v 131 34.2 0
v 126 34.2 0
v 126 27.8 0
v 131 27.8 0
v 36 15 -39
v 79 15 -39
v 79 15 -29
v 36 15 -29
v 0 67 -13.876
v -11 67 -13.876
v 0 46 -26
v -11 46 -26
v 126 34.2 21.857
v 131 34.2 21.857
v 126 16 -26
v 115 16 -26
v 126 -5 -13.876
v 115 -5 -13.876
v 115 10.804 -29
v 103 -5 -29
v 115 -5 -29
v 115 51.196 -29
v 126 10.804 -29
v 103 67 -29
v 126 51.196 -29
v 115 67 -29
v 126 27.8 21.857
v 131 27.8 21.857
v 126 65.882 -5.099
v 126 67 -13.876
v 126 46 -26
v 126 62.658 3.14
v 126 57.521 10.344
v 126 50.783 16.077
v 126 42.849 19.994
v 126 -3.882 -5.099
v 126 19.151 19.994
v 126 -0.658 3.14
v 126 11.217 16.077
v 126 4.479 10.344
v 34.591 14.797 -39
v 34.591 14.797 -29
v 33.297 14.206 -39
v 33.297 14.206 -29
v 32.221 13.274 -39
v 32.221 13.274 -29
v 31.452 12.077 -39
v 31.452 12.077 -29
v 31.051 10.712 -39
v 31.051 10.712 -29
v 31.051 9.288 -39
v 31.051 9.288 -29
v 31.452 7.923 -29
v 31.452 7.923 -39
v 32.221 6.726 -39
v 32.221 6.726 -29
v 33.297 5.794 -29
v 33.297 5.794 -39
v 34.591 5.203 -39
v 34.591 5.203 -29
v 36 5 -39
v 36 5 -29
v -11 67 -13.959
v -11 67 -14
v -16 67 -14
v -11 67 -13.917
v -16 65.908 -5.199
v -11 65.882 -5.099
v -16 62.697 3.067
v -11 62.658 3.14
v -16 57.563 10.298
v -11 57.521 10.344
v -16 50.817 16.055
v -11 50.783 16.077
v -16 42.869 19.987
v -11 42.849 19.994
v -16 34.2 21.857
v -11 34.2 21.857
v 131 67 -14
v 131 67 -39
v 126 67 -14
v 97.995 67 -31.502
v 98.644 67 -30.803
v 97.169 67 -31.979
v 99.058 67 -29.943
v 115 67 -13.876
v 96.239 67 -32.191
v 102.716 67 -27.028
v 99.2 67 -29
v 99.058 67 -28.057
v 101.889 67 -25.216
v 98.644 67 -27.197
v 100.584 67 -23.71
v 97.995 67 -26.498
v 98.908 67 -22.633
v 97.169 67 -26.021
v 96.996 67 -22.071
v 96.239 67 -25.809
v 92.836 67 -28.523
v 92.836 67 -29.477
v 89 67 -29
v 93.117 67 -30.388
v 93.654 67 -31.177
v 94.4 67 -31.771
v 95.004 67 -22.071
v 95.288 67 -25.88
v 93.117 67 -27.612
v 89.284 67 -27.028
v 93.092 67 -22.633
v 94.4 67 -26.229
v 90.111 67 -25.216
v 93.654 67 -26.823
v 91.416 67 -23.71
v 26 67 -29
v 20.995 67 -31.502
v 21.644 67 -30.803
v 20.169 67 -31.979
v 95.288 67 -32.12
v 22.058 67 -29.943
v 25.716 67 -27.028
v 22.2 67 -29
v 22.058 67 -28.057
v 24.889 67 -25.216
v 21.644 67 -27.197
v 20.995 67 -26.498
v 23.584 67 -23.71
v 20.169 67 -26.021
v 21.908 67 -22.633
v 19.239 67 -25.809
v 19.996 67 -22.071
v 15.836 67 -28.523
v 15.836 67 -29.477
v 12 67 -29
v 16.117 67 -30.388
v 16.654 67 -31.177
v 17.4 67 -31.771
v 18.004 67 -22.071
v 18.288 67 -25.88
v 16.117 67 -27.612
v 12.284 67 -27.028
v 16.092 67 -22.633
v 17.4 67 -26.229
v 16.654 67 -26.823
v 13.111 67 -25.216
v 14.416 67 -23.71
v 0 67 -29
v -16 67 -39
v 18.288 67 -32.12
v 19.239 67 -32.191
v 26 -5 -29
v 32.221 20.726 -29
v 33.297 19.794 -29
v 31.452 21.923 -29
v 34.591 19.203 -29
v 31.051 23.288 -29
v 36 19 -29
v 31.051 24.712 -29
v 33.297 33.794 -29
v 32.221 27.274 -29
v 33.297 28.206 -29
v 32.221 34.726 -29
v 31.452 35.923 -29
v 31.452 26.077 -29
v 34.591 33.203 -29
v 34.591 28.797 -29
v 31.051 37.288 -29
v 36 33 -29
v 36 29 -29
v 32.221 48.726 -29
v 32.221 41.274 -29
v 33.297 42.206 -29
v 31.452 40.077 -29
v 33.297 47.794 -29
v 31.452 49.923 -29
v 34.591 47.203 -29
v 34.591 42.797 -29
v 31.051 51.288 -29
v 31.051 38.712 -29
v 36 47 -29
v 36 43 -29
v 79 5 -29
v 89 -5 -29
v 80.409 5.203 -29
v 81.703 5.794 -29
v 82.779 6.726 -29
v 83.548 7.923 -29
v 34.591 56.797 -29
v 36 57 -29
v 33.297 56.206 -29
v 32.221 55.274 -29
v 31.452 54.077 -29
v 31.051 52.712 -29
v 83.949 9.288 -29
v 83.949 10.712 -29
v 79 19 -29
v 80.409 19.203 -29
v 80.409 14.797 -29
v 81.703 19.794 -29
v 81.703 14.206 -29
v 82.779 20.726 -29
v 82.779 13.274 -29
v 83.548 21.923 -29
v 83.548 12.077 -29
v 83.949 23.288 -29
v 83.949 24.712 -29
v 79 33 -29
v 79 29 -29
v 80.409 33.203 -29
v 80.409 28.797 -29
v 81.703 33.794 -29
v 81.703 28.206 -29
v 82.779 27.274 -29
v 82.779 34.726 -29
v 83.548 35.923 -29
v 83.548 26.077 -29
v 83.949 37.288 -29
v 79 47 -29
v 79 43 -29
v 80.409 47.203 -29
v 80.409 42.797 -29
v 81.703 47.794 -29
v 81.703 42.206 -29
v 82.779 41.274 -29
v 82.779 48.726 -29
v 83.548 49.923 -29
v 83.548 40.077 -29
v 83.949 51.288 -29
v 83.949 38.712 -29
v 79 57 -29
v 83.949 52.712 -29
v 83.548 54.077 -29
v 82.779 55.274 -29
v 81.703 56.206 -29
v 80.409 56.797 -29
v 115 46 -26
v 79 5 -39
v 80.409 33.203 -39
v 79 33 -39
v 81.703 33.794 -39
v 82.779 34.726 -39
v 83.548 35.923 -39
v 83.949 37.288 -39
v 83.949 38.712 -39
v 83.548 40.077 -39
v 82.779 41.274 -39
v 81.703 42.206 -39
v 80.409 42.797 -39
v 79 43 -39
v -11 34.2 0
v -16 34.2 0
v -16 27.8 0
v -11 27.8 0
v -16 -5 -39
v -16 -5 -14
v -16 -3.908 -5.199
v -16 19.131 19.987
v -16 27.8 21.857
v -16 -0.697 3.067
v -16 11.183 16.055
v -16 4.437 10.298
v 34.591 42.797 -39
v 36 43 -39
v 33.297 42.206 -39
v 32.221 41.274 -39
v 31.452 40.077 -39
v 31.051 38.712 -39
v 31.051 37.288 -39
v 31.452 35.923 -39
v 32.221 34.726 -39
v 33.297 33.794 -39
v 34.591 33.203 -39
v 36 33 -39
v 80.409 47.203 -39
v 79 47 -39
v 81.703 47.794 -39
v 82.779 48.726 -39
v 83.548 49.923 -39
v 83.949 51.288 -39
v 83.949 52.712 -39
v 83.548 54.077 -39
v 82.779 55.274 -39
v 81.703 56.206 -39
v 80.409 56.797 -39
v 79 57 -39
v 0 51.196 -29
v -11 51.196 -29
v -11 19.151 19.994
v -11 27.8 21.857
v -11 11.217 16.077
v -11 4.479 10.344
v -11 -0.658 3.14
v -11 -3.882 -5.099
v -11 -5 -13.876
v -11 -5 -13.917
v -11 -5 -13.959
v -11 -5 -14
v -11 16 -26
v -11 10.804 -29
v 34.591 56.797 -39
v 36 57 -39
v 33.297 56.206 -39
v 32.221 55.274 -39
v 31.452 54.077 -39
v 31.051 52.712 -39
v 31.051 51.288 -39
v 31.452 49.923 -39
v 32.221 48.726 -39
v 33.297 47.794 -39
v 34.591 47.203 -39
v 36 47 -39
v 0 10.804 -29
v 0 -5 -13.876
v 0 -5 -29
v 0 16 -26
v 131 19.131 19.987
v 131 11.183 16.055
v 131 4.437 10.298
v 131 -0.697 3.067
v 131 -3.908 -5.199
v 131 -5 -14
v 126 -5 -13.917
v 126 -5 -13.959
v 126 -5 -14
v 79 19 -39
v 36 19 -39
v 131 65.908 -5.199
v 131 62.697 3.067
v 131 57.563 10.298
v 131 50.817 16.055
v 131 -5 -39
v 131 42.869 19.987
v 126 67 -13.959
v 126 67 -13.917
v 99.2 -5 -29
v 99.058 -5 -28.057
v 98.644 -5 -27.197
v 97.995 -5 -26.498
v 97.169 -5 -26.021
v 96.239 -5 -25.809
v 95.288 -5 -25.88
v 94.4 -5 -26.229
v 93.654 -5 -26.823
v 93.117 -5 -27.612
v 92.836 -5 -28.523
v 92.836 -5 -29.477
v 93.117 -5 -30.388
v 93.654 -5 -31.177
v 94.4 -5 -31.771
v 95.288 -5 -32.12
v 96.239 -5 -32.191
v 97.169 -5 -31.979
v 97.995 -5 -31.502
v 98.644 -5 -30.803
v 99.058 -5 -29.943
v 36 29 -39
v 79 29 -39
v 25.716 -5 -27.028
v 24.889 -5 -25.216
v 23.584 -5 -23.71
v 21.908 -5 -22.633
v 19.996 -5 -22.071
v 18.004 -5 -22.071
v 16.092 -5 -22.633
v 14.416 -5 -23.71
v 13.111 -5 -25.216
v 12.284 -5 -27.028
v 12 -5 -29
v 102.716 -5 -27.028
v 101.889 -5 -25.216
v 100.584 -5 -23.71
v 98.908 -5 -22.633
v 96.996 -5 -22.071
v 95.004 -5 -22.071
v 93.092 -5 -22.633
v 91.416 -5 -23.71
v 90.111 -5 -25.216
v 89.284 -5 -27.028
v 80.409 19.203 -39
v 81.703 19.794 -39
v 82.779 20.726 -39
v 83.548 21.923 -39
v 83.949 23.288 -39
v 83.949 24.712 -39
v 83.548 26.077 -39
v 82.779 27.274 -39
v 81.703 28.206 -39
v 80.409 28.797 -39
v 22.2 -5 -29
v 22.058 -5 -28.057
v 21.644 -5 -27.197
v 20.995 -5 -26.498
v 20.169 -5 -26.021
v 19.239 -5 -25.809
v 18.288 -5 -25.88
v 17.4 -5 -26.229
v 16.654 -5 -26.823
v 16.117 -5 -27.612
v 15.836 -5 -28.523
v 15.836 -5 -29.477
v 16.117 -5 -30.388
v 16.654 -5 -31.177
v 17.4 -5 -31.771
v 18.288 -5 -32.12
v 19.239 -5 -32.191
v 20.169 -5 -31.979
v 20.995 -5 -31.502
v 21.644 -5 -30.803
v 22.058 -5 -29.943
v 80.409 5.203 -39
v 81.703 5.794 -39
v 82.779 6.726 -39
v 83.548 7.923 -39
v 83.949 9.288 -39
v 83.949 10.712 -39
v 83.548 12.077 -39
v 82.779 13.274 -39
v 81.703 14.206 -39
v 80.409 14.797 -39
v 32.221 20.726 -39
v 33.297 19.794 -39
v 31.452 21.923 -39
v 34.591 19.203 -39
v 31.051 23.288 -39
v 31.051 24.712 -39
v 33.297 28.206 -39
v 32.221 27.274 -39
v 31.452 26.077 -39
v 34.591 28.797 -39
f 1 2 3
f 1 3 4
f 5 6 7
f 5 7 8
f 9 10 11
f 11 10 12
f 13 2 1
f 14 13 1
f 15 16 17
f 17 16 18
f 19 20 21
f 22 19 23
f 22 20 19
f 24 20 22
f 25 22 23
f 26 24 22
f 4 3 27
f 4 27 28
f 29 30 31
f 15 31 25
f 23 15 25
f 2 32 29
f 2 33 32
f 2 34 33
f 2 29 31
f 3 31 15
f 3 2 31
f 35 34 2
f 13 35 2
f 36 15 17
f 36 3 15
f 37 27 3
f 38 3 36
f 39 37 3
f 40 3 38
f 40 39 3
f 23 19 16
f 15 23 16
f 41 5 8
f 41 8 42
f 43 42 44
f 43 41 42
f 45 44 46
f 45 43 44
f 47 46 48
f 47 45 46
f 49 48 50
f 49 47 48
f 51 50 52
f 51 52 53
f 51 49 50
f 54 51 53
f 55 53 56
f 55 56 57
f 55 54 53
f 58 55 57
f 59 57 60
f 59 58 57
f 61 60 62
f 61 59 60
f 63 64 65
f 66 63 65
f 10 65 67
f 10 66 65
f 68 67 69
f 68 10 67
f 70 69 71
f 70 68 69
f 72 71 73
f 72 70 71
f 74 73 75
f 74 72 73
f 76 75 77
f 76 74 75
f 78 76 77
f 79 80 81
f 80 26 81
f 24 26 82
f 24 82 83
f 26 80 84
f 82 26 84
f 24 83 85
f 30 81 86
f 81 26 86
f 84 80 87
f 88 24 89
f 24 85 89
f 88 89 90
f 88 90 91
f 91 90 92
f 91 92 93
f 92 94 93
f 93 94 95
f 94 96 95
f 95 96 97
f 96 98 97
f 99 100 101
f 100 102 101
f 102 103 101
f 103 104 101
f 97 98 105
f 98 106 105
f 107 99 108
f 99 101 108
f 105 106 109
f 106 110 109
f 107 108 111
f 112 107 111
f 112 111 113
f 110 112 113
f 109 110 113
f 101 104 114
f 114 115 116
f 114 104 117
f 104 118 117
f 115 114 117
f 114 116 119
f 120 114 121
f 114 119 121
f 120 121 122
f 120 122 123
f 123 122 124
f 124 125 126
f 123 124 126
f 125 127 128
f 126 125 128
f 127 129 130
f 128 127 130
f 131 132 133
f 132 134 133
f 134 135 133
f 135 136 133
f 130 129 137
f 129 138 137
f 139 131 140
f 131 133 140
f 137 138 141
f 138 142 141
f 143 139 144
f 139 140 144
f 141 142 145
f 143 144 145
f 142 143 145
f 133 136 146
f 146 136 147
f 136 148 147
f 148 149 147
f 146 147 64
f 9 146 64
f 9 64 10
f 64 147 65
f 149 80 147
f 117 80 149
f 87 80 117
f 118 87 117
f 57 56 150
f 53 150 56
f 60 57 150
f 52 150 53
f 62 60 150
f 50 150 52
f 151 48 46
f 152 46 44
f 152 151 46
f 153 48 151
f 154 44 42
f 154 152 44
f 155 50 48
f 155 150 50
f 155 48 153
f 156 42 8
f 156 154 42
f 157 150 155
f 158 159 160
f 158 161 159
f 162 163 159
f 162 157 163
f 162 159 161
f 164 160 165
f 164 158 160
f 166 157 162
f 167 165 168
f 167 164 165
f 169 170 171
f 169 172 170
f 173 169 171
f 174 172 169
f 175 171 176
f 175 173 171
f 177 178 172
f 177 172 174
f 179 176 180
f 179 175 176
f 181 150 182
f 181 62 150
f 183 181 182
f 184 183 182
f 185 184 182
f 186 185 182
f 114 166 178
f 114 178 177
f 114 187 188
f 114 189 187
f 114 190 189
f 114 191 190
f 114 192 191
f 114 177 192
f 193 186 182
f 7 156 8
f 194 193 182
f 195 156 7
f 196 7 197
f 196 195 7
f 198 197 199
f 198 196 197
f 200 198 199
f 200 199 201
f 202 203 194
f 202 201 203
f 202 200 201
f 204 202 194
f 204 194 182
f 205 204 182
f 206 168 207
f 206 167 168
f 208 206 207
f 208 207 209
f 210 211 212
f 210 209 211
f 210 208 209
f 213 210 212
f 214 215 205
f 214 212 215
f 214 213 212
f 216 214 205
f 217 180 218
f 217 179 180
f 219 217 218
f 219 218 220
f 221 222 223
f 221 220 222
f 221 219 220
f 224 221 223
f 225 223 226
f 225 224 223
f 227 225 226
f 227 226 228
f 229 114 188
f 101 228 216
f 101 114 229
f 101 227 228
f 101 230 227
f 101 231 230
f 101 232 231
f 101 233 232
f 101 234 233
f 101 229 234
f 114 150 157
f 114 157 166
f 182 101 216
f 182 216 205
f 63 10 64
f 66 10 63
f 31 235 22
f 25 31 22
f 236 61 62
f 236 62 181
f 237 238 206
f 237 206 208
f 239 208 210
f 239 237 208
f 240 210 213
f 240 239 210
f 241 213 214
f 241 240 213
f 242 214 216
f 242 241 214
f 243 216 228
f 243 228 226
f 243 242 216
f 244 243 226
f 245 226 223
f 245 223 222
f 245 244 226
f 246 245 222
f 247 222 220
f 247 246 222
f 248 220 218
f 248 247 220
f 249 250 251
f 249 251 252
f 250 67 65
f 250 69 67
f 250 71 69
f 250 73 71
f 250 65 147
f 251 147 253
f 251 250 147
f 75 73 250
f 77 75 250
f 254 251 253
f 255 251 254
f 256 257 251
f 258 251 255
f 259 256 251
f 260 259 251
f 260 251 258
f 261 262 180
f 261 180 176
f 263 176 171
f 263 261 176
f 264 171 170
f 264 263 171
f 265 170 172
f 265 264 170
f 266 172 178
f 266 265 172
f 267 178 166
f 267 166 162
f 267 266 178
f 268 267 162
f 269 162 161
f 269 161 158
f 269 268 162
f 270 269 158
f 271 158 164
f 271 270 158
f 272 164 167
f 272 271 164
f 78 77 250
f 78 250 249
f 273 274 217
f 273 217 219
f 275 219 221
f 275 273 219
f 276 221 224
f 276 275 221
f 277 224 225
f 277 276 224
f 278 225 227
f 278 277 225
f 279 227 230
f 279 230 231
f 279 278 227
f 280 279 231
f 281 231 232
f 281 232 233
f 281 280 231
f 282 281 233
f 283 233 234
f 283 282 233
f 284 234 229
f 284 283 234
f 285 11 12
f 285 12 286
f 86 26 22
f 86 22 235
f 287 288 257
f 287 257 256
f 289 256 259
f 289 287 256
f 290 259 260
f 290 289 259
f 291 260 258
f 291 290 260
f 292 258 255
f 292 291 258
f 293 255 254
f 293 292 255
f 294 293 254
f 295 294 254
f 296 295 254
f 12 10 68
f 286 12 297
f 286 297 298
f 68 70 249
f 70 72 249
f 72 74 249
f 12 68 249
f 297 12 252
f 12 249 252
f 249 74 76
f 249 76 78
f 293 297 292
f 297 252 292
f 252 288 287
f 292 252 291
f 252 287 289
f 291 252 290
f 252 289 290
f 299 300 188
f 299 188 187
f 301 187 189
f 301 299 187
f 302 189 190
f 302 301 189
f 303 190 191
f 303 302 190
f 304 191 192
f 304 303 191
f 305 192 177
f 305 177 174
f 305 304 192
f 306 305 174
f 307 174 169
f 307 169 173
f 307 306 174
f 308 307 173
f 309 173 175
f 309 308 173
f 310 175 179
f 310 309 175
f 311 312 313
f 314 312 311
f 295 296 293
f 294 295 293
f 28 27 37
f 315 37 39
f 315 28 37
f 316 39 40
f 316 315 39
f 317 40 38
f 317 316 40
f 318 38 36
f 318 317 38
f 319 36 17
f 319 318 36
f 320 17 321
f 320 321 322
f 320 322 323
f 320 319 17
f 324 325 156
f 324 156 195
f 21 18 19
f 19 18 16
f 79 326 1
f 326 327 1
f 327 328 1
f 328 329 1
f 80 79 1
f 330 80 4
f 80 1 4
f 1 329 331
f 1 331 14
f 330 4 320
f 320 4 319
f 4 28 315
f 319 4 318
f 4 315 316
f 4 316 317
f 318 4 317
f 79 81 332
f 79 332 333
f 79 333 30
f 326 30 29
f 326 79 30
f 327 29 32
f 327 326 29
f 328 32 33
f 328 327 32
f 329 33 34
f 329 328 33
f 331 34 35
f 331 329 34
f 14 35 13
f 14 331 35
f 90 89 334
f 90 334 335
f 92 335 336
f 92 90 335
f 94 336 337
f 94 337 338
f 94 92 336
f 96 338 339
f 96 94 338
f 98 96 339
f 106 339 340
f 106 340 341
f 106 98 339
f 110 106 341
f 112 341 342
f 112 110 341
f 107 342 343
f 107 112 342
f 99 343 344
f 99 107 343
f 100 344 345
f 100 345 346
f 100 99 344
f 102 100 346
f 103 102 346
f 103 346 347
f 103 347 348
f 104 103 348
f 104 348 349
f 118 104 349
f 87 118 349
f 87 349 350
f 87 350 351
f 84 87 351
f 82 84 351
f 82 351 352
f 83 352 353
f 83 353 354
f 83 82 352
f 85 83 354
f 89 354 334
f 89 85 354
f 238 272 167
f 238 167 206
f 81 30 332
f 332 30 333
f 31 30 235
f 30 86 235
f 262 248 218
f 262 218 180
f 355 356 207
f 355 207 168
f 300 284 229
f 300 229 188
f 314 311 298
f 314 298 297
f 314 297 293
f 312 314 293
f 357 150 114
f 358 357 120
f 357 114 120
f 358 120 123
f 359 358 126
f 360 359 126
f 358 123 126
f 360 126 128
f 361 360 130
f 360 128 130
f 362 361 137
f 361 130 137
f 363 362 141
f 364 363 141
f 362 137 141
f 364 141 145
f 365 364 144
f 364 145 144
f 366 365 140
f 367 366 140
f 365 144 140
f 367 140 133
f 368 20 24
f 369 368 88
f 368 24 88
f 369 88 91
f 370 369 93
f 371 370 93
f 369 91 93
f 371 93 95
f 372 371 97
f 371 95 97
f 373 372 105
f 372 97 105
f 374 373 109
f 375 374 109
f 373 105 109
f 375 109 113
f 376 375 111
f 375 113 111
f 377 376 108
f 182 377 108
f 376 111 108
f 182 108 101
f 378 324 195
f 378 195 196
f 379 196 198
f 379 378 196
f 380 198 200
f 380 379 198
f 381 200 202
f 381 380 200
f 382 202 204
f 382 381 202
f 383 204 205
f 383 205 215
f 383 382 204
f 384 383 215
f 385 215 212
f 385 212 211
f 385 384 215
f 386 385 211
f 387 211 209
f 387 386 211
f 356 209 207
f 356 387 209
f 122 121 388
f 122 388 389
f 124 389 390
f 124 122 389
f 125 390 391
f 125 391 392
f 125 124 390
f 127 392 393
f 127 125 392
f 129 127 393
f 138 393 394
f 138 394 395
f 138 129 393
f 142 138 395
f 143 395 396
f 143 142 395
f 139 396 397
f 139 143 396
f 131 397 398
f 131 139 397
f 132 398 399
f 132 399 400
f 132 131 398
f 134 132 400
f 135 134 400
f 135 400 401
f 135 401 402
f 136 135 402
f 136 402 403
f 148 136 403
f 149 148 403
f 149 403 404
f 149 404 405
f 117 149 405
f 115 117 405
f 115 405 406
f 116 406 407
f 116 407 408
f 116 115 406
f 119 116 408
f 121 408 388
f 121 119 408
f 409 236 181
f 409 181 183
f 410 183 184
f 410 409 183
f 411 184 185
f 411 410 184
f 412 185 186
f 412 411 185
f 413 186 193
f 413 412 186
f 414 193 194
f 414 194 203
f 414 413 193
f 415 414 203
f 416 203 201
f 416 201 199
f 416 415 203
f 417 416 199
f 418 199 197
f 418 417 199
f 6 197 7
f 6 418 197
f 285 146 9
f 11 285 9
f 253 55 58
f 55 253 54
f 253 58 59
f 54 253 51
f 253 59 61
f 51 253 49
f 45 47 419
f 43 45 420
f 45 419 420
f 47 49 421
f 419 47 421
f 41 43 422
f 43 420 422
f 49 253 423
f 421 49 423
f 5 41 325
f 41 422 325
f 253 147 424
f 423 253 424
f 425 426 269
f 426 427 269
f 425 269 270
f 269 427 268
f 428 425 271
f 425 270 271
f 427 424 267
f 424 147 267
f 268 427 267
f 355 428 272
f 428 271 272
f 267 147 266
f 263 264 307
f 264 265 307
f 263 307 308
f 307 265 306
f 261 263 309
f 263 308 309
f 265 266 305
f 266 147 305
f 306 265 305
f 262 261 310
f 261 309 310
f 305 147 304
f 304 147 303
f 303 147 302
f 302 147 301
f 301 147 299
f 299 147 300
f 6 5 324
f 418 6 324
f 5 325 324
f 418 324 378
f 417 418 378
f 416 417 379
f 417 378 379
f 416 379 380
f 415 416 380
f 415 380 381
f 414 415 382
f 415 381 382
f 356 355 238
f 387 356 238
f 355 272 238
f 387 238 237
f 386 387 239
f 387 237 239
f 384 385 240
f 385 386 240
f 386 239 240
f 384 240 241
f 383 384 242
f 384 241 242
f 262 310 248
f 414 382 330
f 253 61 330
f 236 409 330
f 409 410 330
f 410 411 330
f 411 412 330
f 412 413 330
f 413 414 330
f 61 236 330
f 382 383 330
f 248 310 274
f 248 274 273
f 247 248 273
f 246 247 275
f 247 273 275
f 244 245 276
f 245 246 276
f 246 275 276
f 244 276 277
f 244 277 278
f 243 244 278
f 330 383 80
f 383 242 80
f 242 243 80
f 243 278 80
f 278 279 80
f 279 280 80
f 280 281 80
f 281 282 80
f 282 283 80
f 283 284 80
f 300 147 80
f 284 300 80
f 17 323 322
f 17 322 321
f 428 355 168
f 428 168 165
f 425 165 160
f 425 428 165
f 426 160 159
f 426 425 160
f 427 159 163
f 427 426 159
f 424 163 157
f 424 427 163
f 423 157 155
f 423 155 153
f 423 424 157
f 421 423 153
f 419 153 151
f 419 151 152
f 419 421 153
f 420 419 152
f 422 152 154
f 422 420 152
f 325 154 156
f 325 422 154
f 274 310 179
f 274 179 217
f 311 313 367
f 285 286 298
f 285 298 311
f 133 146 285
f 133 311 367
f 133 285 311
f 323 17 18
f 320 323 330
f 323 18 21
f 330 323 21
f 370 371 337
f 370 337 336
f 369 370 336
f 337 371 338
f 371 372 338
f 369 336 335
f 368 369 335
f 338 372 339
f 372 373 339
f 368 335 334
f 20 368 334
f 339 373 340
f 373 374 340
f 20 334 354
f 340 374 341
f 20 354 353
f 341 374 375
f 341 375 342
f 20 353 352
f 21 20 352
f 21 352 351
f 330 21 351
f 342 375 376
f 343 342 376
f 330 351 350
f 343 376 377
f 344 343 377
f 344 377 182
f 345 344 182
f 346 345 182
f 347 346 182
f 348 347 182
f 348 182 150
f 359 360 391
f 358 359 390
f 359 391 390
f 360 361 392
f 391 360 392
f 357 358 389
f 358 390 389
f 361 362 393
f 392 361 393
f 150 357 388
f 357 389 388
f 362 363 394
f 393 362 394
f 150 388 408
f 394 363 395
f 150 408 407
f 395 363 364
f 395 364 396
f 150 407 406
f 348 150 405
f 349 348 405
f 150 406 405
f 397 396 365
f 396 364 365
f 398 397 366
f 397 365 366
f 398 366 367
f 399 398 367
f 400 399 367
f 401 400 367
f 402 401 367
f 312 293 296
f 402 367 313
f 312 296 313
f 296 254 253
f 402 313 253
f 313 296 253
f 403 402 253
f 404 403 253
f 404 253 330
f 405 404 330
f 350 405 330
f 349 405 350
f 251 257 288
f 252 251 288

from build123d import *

# Parameters (mm, degrees)
BOX004_W               = 147
BOX004_H               = 72
BOX004_DEPTH           = 10
BOX005_W               = 5
BOX005_H               = 72
BOX005_DEPTH           = 15
CYLINDER003_W          = 36
CYLINDER003_H          = 5
CYLINDER003_ANGLE      = 180
BOX006_W               = 5
BOX006_H               = 72
BOX006_DEPTH           = 15
CYLINDER004_W          = 36
CYLINDER004_H          = 5
CYLINDER004_ANGLE      = 180
BOX007_W               = 147
BOX007_H               = 6.4
BOX007_DEPTH           = 22
CYLINDER005_R          = 7
CYLINDER005_DEPTH      = 72
CYLINDER006_R          = 7
CYLINDER006_DEPTH      = 72
CYLINDER007_R          = 3.2
CYLINDER007_DEPTH      = 72
CYLINDER008_R          = 3.2
CYLINDER008_DEPTH      = 72
PRISM001_DEPTH         = 11
PRISM002_DEPTH         = 11
PRISM003_DEPTH         = 11
PRISM004_DEPTH         = 11
POCKET001_DEPTH        = 10
LINEARPATTERN001_COUNT = 4
LINEARPATTERN001_PITCH = 14


with BuildPart() as part:
    # Box004 → Box004 (join)
    with BuildSketch(Plane.XY):
        with Locations((73.5, 36)):
            Rectangle(BOX004_W, BOX004_H)
    extrude(amount=BOX004_DEPTH)

    # Box005 → Box005 (join)
    with BuildSketch(Plane.XY.offset(10)):
        with Locations((2.5, 36)):
            Rectangle(BOX005_W, BOX005_H)
    extrude(amount=BOX005_DEPTH)

    # Cylinder003 → Cylinder003 (revolve)
    with BuildSketch(Plane(origin=(0, 36, 25), x_dir=(0, 1, 0), z_dir=(0, 0, -1))):
        with Locations((18, 2.5)):
            Rectangle(CYLINDER003_W, CYLINDER003_H)
    revolve(axis=Axis((0, 36, 25), (1, 0, 0)), revolution_arc=CYLINDER003_ANGLE)

    # Box006 → Box006 (join)
    with BuildSketch(Plane(origin=(142, 0, 10), x_dir=(1, 0, 0), z_dir=(0, 0, 1))):
        with Locations((2.5, 36)):
            Rectangle(BOX006_W, BOX006_H)
    extrude(amount=BOX006_DEPTH)

    # Cylinder004 → Cylinder004 (revolve)
    with BuildSketch(Plane(origin=(142, 36, 25), x_dir=(0, 1, 0), z_dir=(0, 0, -1))):
        with Locations((18, 2.5)):
            Rectangle(CYLINDER004_W, CYLINDER004_H)
    revolve(axis=Axis((142, 36, 25), (1, 0, 0)), revolution_arc=CYLINDER004_ANGLE)

    # Box007 → Box007 (cut)
    with BuildSketch(Plane(origin=(0, 32.8, 39), x_dir=(1, 0, 0), z_dir=(0, 0, 1))):
        with Locations((73.5, 3.2)):
            Rectangle(BOX007_W, BOX007_H)
    extrude(amount=BOX007_DEPTH, mode=Mode.SUBTRACT)

    # Cylinder005 → Cylinder005 (join)
    with BuildSketch(Plane(origin=(35, 72, 10), x_dir=(1, 0, 0), z_dir=(0, -1, 0))):
        Circle(CYLINDER005_R)
    extrude(amount=CYLINDER005_DEPTH)

    # Cylinder006 → Cylinder006 (join)
    with BuildSketch(Plane(origin=(112, 72, 10), x_dir=(1, 0, 0), z_dir=(0, -1, 0))):
        Circle(CYLINDER006_R)
    extrude(amount=CYLINDER006_DEPTH)

    # Cylinder007 → Cylinder007 (cut)
    with BuildSketch(Plane(origin=(35, 72, 10), x_dir=(1, 0, 0), z_dir=(0, -1, 0))):
        Circle(CYLINDER007_R)
    extrude(amount=CYLINDER007_DEPTH, mode=Mode.SUBTRACT)

    # Cylinder008 → Cylinder008 (cut)
    with BuildSketch(Plane(origin=(112, 72, 10), x_dir=(1, 0, 0), z_dir=(0, -1, 0))):
        Circle(CYLINDER008_R)
    extrude(amount=CYLINDER008_DEPTH, mode=Mode.SUBTRACT)

    # Prism001 → Prism001 (join)
    with BuildSketch(Plane(origin=(5, 7, 13), x_dir=(0, 1, 0), z_dir=(1, 0, 0))):
        Polygon((14, 0), (-7, 12.124356), (-7, -12.124356), align=None)
    extrude(amount=PRISM001_DEPTH)

    # Prism002 → Prism002 (join)
    with BuildSketch(Plane(origin=(131, 7, 13), x_dir=(0, 1, 0), z_dir=(1, 0, 0))):
        Polygon((14, 0), (-7, 12.124356), (-7, -12.124356), align=None)
    extrude(amount=PRISM002_DEPTH)

    # Prism003 → Prism003 (join)
    with BuildSketch(Plane(origin=(131, 65, 13), x_dir=(0, -1, 0), z_dir=(1, 0, 0))):
        Polygon((14, 0), (-7, 12.124356), (-7, -12.124356), align=None)
    extrude(amount=PRISM003_DEPTH)

    # Prism004 → Prism004 (join)
    with BuildSketch(Plane(origin=(5, 65, 13), x_dir=(0, -1, 0), z_dir=(1, 0, 0))):
        Polygon((14, 0), (-7, 12.124356), (-7, -12.124356), align=None)
    extrude(amount=PRISM004_DEPTH)

    # Sketch001 → Pocket001 (cut)
    with BuildSketch(Plane.XY):
        with BuildLine():
            ThreePointArc((52, 20), (47, 15), (52, 10))
            Line((52, 10), (95, 10))
            ThreePointArc((95, 10), (100, 15), (95, 20))
            Line((95, 20), (52, 20))
        make_face()
    pocket001 = extrude(amount=POCKET001_DEPTH, mode=Mode.SUBTRACT)

    # LinearPattern001: Pocket001 ×4
    with Locations(*[(0, i * LINEARPATTERN001_PITCH, 0) for i in range(1, LINEARPATTERN001_COUNT)]):
        add(pocket001, mode=Mode.SUBTRACT)


with BuildPart() as part_1:
    # Body003 placement: moved
    add(part.part.moved(Location((-16, -5, -39))))


solid = part_1.part
